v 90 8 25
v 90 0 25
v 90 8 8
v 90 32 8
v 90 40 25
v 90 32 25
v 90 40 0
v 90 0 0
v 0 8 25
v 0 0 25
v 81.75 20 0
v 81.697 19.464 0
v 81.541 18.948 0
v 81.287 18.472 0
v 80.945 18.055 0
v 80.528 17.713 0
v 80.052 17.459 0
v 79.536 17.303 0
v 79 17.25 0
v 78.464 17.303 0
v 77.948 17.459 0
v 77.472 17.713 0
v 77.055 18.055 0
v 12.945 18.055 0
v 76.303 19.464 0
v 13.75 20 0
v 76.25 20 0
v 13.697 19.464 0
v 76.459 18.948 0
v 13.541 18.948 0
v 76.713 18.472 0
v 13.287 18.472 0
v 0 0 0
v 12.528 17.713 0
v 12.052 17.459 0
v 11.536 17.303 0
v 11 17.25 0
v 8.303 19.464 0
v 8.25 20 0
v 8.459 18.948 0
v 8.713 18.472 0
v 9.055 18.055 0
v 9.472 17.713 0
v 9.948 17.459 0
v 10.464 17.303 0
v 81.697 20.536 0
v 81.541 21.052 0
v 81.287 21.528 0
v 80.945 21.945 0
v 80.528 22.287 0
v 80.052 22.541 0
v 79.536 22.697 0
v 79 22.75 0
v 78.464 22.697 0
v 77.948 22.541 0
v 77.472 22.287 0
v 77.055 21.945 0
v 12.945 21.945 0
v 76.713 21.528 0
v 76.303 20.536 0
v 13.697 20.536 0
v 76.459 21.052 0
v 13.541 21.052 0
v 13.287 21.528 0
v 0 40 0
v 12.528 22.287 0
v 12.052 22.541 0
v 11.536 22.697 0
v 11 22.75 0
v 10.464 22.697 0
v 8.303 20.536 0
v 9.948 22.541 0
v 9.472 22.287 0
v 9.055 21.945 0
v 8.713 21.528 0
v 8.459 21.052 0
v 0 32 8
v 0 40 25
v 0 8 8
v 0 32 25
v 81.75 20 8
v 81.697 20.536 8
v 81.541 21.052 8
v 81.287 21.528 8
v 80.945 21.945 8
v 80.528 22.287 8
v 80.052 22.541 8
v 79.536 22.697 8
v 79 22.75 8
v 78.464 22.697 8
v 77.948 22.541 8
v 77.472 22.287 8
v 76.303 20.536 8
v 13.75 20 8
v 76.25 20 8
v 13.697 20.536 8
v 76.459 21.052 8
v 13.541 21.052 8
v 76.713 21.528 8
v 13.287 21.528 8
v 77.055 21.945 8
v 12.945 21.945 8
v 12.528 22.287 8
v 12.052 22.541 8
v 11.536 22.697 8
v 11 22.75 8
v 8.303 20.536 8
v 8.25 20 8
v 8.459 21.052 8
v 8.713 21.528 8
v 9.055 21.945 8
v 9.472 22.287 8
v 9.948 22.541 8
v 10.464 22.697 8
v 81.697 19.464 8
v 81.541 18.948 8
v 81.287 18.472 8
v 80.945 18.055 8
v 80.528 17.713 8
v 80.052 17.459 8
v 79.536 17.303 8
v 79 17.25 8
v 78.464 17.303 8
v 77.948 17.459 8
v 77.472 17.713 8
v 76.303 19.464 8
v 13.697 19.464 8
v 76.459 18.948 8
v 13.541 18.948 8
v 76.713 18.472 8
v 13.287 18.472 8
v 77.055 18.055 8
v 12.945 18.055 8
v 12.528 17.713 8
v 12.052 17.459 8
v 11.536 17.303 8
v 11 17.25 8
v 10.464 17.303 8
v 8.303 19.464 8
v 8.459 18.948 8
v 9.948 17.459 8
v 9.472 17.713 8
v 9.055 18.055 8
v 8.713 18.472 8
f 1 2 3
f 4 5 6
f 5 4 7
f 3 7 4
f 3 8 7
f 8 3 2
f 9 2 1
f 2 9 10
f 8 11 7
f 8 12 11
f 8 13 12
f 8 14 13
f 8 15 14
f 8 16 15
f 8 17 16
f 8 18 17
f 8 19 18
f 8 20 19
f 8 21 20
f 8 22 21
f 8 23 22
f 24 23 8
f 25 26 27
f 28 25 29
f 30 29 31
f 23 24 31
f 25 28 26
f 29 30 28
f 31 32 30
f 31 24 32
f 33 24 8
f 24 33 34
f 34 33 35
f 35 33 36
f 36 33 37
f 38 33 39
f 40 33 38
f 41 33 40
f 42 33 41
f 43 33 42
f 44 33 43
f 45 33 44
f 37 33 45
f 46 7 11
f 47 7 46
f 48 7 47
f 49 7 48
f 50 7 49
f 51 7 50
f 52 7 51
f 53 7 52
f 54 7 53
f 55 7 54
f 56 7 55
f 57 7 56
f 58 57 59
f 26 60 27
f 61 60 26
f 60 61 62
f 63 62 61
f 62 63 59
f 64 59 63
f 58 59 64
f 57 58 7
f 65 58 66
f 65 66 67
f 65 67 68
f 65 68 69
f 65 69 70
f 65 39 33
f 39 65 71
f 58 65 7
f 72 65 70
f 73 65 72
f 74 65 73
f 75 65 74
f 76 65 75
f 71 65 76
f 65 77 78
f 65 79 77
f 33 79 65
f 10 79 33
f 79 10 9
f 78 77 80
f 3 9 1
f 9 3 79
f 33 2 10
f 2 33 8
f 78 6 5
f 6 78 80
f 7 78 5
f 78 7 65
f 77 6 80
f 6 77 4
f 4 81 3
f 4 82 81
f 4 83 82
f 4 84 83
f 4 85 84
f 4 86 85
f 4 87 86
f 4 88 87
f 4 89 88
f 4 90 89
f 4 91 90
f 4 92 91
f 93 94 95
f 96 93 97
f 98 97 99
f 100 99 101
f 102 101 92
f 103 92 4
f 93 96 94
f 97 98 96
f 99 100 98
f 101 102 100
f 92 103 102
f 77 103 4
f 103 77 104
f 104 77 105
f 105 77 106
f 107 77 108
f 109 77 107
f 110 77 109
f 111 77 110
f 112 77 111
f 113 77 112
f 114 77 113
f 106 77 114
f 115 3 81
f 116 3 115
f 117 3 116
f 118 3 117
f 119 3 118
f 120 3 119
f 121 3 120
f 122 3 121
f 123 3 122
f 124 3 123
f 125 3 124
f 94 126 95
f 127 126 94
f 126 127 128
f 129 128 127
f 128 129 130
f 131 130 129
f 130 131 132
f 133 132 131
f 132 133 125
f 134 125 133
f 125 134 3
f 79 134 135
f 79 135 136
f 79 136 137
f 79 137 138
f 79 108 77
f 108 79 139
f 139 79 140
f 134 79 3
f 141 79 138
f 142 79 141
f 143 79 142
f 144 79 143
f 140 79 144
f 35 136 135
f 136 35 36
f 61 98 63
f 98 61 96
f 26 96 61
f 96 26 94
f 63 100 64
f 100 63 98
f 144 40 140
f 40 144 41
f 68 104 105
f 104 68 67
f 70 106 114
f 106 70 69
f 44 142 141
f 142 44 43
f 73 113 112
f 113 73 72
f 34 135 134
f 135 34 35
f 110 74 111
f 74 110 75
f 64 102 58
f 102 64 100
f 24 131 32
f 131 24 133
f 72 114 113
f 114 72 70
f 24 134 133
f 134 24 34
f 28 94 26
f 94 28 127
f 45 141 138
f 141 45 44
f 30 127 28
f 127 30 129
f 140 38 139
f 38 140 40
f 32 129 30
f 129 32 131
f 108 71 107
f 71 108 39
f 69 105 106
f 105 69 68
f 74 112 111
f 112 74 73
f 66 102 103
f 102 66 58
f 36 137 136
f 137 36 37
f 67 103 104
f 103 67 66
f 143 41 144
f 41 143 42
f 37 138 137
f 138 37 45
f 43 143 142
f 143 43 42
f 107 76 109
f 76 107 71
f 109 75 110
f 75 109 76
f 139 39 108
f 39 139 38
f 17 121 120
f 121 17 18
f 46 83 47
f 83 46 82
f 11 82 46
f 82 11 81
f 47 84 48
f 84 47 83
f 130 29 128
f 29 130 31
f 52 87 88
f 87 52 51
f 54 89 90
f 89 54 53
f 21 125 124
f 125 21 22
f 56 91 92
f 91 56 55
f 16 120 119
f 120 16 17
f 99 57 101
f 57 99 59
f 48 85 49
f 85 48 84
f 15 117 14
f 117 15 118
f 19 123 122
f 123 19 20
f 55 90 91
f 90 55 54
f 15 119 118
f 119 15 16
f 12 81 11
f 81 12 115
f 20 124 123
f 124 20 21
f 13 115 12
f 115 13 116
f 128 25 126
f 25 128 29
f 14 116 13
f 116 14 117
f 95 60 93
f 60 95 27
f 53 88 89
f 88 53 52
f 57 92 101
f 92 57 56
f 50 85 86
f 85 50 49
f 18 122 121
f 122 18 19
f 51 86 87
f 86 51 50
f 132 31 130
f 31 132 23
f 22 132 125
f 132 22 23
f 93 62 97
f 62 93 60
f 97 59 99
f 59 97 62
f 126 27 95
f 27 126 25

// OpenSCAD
$fn = 32;

// ----------------------------------------------------------------------
// U-bracket: 90 x 40 x 25 mm
// ----------------------------------------------------------------------

// --- parameters (mm) ---
base_len = 90;            // outer length, X
channel_w = 40;           // outer width, Y
upright_h = 25;           // upright height, Z
mat_t = 8;                // wall thickness
hole_d = 5.5;             // clearance for M5

module hole_z(px, py) {
  translate([px, py, -0.5]) cylinder(h = mat_t + 1, d = hole_d);
}
module hole_y_pz(pz) {
  /* through both uprights along Y */
  translate([0, -0.5, pz]) rotate([-90, 0, 0]) cylinder(h = channel_w + 1, d = hole_d);
}

module base() {
  cube([base_len, channel_w, mat_t]);
}

module uprights() {
  cube([base_len, mat_t, upright_h]);
  translate([0, channel_w - mat_t, 0]) cube([base_len, mat_t, upright_h]);
}

difference() {
  union() {
    base();
    uprights();
  }
  hole_z(11, 20);
  hole_z(79, 20);
}
